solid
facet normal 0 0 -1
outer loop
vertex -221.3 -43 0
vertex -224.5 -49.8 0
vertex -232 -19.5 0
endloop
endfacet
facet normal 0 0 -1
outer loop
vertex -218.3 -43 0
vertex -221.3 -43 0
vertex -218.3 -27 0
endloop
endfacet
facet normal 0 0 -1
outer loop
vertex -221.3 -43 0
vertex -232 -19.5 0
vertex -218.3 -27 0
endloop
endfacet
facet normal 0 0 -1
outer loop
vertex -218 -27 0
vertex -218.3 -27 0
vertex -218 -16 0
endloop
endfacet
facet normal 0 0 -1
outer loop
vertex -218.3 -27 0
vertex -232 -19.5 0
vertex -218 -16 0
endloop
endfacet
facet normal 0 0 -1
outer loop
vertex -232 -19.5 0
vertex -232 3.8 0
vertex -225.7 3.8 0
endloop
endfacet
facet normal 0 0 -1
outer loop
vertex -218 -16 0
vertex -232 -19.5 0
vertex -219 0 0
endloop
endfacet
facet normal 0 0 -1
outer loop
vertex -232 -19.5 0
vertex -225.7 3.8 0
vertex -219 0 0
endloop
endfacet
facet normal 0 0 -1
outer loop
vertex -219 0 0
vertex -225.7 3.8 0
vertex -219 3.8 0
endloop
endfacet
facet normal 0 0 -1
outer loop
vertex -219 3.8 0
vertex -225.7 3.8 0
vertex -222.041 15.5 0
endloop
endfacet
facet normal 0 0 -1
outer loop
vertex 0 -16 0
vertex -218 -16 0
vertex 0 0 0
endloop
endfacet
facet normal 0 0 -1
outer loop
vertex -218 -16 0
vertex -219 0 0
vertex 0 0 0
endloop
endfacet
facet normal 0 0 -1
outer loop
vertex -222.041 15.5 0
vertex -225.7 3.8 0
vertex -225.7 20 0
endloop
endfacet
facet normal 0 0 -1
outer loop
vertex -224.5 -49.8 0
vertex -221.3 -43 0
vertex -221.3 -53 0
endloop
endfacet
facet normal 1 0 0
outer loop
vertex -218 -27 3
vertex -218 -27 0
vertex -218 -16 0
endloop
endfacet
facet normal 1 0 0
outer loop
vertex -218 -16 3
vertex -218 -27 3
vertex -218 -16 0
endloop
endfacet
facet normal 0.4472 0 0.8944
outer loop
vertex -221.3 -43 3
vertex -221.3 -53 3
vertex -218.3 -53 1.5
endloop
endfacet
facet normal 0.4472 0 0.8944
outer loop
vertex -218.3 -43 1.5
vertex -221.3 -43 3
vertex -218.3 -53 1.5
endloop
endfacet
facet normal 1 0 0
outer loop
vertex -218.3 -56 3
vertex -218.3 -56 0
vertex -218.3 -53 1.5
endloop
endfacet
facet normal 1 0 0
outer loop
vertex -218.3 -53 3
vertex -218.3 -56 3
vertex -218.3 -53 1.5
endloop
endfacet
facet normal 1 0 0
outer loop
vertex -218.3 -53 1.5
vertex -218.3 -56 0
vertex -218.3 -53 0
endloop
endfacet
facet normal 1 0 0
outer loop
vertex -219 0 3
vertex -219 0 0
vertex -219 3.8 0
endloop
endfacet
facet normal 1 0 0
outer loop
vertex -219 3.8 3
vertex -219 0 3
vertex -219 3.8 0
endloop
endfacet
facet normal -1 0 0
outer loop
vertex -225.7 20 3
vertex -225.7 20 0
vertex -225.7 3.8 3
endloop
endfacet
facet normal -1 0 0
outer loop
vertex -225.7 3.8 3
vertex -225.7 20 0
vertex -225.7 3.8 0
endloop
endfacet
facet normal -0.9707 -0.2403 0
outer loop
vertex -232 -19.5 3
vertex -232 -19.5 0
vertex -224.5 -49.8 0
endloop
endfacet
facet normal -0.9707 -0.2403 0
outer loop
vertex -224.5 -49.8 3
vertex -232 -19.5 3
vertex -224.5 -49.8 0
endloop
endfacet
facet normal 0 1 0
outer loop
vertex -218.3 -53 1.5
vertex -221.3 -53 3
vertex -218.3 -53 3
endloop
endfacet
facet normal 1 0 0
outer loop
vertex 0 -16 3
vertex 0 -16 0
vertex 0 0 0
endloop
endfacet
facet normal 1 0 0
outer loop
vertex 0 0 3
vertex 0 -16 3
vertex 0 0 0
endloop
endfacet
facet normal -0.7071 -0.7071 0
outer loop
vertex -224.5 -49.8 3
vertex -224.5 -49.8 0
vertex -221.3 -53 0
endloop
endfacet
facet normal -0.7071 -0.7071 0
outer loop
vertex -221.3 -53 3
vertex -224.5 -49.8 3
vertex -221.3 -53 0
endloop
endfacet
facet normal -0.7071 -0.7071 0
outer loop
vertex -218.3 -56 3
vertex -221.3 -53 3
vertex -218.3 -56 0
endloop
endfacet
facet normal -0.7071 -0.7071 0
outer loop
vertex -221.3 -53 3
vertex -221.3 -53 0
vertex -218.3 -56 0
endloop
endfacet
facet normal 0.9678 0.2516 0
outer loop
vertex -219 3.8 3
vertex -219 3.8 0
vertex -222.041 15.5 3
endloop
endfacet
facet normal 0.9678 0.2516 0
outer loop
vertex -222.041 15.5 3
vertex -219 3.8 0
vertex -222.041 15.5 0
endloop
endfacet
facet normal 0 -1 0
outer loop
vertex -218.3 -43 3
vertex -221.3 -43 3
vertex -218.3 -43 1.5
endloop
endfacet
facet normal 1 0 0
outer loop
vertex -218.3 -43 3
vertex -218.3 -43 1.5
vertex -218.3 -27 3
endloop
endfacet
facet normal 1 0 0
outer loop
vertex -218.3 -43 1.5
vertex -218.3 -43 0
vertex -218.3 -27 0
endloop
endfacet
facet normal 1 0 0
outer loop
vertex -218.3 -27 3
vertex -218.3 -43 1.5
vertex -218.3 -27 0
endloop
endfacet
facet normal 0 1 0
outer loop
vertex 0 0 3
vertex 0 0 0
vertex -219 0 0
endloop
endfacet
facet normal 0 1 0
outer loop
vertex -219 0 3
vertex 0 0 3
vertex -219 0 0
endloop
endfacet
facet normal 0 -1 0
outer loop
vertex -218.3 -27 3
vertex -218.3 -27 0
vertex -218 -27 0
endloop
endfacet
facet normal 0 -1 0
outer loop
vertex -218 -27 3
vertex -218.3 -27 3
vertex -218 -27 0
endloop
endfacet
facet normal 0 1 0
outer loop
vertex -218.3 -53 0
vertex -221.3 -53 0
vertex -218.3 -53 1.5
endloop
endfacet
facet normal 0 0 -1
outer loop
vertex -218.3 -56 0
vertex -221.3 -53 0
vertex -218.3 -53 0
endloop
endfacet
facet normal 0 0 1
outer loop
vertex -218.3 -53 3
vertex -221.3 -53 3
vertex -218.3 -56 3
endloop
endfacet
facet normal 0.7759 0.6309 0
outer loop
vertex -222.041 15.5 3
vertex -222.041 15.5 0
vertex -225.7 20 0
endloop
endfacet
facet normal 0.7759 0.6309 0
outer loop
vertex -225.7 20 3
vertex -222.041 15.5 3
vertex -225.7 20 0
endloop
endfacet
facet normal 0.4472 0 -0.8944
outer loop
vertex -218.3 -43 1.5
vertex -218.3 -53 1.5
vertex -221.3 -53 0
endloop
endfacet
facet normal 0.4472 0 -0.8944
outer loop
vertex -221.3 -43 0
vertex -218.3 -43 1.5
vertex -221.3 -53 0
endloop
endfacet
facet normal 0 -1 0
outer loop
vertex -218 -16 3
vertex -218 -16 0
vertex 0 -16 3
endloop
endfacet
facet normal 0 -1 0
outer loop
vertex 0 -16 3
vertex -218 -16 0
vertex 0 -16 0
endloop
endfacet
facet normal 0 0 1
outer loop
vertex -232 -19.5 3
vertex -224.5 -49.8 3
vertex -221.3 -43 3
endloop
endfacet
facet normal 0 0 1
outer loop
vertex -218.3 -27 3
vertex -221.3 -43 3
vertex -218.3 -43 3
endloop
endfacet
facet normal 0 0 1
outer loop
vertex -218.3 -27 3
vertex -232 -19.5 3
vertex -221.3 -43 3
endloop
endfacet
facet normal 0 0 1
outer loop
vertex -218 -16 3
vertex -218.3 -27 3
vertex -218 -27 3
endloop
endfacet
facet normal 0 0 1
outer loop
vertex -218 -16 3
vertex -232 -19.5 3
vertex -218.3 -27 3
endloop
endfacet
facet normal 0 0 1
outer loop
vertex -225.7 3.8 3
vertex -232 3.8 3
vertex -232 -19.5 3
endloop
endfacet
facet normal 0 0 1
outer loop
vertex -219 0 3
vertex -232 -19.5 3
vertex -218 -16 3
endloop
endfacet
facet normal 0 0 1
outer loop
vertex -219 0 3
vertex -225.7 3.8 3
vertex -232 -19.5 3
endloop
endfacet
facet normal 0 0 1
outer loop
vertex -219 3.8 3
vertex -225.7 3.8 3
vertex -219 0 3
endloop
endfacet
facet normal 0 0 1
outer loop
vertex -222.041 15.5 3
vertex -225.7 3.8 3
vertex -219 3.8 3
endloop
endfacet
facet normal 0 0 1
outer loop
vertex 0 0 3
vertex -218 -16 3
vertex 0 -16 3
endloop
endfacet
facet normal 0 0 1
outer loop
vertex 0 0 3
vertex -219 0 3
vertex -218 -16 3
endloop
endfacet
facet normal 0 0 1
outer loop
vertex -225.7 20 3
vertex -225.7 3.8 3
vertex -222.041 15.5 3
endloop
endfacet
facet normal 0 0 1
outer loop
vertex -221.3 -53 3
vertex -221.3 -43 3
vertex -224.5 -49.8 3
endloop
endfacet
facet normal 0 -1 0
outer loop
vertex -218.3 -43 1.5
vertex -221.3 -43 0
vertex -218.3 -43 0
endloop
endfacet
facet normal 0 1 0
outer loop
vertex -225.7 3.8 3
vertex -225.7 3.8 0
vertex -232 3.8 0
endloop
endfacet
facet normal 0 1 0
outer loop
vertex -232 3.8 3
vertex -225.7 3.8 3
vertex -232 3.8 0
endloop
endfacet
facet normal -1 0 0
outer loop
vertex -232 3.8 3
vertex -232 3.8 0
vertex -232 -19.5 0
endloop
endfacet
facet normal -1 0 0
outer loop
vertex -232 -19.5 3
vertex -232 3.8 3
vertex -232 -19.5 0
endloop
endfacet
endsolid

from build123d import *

# Parameters (mm, degrees)
F1_DEPTH = 3
F4_DEPTH = 10


# Not quite as in the source:
# - a feature names something its author has since deleted; it is built from what else it names


with BuildPart() as f1:
    # F0 (on Top) → F1 (new body)
    with BuildSketch(Plane.XY):
        Polygon((0, -16), (0, 0), (-219, 0), (-219, 3.8), (-222.0407651073, 15.5), (-225.7, 20), (-225.7, 3.8), (-232, 3.8), (-232, -19.5), (-224.5, -49.8), (-218.3, -56), (-218.3, -27), (-218, -27), (-218, -16), align=None)
    extrude(amount=F1_DEPTH)

    # F3 (on offset) → F4 (cut)
    with BuildSketch(Plane.XZ.offset(53)):
        Polygon((-221.3, 3), (-218.3, 1.5), (-221.3, 0), (-213.3, 0), (-213.3, 3), align=None)
    extrude(amount=-F4_DEPTH, mode=Mode.SUBTRACT)


solid = f1.part
